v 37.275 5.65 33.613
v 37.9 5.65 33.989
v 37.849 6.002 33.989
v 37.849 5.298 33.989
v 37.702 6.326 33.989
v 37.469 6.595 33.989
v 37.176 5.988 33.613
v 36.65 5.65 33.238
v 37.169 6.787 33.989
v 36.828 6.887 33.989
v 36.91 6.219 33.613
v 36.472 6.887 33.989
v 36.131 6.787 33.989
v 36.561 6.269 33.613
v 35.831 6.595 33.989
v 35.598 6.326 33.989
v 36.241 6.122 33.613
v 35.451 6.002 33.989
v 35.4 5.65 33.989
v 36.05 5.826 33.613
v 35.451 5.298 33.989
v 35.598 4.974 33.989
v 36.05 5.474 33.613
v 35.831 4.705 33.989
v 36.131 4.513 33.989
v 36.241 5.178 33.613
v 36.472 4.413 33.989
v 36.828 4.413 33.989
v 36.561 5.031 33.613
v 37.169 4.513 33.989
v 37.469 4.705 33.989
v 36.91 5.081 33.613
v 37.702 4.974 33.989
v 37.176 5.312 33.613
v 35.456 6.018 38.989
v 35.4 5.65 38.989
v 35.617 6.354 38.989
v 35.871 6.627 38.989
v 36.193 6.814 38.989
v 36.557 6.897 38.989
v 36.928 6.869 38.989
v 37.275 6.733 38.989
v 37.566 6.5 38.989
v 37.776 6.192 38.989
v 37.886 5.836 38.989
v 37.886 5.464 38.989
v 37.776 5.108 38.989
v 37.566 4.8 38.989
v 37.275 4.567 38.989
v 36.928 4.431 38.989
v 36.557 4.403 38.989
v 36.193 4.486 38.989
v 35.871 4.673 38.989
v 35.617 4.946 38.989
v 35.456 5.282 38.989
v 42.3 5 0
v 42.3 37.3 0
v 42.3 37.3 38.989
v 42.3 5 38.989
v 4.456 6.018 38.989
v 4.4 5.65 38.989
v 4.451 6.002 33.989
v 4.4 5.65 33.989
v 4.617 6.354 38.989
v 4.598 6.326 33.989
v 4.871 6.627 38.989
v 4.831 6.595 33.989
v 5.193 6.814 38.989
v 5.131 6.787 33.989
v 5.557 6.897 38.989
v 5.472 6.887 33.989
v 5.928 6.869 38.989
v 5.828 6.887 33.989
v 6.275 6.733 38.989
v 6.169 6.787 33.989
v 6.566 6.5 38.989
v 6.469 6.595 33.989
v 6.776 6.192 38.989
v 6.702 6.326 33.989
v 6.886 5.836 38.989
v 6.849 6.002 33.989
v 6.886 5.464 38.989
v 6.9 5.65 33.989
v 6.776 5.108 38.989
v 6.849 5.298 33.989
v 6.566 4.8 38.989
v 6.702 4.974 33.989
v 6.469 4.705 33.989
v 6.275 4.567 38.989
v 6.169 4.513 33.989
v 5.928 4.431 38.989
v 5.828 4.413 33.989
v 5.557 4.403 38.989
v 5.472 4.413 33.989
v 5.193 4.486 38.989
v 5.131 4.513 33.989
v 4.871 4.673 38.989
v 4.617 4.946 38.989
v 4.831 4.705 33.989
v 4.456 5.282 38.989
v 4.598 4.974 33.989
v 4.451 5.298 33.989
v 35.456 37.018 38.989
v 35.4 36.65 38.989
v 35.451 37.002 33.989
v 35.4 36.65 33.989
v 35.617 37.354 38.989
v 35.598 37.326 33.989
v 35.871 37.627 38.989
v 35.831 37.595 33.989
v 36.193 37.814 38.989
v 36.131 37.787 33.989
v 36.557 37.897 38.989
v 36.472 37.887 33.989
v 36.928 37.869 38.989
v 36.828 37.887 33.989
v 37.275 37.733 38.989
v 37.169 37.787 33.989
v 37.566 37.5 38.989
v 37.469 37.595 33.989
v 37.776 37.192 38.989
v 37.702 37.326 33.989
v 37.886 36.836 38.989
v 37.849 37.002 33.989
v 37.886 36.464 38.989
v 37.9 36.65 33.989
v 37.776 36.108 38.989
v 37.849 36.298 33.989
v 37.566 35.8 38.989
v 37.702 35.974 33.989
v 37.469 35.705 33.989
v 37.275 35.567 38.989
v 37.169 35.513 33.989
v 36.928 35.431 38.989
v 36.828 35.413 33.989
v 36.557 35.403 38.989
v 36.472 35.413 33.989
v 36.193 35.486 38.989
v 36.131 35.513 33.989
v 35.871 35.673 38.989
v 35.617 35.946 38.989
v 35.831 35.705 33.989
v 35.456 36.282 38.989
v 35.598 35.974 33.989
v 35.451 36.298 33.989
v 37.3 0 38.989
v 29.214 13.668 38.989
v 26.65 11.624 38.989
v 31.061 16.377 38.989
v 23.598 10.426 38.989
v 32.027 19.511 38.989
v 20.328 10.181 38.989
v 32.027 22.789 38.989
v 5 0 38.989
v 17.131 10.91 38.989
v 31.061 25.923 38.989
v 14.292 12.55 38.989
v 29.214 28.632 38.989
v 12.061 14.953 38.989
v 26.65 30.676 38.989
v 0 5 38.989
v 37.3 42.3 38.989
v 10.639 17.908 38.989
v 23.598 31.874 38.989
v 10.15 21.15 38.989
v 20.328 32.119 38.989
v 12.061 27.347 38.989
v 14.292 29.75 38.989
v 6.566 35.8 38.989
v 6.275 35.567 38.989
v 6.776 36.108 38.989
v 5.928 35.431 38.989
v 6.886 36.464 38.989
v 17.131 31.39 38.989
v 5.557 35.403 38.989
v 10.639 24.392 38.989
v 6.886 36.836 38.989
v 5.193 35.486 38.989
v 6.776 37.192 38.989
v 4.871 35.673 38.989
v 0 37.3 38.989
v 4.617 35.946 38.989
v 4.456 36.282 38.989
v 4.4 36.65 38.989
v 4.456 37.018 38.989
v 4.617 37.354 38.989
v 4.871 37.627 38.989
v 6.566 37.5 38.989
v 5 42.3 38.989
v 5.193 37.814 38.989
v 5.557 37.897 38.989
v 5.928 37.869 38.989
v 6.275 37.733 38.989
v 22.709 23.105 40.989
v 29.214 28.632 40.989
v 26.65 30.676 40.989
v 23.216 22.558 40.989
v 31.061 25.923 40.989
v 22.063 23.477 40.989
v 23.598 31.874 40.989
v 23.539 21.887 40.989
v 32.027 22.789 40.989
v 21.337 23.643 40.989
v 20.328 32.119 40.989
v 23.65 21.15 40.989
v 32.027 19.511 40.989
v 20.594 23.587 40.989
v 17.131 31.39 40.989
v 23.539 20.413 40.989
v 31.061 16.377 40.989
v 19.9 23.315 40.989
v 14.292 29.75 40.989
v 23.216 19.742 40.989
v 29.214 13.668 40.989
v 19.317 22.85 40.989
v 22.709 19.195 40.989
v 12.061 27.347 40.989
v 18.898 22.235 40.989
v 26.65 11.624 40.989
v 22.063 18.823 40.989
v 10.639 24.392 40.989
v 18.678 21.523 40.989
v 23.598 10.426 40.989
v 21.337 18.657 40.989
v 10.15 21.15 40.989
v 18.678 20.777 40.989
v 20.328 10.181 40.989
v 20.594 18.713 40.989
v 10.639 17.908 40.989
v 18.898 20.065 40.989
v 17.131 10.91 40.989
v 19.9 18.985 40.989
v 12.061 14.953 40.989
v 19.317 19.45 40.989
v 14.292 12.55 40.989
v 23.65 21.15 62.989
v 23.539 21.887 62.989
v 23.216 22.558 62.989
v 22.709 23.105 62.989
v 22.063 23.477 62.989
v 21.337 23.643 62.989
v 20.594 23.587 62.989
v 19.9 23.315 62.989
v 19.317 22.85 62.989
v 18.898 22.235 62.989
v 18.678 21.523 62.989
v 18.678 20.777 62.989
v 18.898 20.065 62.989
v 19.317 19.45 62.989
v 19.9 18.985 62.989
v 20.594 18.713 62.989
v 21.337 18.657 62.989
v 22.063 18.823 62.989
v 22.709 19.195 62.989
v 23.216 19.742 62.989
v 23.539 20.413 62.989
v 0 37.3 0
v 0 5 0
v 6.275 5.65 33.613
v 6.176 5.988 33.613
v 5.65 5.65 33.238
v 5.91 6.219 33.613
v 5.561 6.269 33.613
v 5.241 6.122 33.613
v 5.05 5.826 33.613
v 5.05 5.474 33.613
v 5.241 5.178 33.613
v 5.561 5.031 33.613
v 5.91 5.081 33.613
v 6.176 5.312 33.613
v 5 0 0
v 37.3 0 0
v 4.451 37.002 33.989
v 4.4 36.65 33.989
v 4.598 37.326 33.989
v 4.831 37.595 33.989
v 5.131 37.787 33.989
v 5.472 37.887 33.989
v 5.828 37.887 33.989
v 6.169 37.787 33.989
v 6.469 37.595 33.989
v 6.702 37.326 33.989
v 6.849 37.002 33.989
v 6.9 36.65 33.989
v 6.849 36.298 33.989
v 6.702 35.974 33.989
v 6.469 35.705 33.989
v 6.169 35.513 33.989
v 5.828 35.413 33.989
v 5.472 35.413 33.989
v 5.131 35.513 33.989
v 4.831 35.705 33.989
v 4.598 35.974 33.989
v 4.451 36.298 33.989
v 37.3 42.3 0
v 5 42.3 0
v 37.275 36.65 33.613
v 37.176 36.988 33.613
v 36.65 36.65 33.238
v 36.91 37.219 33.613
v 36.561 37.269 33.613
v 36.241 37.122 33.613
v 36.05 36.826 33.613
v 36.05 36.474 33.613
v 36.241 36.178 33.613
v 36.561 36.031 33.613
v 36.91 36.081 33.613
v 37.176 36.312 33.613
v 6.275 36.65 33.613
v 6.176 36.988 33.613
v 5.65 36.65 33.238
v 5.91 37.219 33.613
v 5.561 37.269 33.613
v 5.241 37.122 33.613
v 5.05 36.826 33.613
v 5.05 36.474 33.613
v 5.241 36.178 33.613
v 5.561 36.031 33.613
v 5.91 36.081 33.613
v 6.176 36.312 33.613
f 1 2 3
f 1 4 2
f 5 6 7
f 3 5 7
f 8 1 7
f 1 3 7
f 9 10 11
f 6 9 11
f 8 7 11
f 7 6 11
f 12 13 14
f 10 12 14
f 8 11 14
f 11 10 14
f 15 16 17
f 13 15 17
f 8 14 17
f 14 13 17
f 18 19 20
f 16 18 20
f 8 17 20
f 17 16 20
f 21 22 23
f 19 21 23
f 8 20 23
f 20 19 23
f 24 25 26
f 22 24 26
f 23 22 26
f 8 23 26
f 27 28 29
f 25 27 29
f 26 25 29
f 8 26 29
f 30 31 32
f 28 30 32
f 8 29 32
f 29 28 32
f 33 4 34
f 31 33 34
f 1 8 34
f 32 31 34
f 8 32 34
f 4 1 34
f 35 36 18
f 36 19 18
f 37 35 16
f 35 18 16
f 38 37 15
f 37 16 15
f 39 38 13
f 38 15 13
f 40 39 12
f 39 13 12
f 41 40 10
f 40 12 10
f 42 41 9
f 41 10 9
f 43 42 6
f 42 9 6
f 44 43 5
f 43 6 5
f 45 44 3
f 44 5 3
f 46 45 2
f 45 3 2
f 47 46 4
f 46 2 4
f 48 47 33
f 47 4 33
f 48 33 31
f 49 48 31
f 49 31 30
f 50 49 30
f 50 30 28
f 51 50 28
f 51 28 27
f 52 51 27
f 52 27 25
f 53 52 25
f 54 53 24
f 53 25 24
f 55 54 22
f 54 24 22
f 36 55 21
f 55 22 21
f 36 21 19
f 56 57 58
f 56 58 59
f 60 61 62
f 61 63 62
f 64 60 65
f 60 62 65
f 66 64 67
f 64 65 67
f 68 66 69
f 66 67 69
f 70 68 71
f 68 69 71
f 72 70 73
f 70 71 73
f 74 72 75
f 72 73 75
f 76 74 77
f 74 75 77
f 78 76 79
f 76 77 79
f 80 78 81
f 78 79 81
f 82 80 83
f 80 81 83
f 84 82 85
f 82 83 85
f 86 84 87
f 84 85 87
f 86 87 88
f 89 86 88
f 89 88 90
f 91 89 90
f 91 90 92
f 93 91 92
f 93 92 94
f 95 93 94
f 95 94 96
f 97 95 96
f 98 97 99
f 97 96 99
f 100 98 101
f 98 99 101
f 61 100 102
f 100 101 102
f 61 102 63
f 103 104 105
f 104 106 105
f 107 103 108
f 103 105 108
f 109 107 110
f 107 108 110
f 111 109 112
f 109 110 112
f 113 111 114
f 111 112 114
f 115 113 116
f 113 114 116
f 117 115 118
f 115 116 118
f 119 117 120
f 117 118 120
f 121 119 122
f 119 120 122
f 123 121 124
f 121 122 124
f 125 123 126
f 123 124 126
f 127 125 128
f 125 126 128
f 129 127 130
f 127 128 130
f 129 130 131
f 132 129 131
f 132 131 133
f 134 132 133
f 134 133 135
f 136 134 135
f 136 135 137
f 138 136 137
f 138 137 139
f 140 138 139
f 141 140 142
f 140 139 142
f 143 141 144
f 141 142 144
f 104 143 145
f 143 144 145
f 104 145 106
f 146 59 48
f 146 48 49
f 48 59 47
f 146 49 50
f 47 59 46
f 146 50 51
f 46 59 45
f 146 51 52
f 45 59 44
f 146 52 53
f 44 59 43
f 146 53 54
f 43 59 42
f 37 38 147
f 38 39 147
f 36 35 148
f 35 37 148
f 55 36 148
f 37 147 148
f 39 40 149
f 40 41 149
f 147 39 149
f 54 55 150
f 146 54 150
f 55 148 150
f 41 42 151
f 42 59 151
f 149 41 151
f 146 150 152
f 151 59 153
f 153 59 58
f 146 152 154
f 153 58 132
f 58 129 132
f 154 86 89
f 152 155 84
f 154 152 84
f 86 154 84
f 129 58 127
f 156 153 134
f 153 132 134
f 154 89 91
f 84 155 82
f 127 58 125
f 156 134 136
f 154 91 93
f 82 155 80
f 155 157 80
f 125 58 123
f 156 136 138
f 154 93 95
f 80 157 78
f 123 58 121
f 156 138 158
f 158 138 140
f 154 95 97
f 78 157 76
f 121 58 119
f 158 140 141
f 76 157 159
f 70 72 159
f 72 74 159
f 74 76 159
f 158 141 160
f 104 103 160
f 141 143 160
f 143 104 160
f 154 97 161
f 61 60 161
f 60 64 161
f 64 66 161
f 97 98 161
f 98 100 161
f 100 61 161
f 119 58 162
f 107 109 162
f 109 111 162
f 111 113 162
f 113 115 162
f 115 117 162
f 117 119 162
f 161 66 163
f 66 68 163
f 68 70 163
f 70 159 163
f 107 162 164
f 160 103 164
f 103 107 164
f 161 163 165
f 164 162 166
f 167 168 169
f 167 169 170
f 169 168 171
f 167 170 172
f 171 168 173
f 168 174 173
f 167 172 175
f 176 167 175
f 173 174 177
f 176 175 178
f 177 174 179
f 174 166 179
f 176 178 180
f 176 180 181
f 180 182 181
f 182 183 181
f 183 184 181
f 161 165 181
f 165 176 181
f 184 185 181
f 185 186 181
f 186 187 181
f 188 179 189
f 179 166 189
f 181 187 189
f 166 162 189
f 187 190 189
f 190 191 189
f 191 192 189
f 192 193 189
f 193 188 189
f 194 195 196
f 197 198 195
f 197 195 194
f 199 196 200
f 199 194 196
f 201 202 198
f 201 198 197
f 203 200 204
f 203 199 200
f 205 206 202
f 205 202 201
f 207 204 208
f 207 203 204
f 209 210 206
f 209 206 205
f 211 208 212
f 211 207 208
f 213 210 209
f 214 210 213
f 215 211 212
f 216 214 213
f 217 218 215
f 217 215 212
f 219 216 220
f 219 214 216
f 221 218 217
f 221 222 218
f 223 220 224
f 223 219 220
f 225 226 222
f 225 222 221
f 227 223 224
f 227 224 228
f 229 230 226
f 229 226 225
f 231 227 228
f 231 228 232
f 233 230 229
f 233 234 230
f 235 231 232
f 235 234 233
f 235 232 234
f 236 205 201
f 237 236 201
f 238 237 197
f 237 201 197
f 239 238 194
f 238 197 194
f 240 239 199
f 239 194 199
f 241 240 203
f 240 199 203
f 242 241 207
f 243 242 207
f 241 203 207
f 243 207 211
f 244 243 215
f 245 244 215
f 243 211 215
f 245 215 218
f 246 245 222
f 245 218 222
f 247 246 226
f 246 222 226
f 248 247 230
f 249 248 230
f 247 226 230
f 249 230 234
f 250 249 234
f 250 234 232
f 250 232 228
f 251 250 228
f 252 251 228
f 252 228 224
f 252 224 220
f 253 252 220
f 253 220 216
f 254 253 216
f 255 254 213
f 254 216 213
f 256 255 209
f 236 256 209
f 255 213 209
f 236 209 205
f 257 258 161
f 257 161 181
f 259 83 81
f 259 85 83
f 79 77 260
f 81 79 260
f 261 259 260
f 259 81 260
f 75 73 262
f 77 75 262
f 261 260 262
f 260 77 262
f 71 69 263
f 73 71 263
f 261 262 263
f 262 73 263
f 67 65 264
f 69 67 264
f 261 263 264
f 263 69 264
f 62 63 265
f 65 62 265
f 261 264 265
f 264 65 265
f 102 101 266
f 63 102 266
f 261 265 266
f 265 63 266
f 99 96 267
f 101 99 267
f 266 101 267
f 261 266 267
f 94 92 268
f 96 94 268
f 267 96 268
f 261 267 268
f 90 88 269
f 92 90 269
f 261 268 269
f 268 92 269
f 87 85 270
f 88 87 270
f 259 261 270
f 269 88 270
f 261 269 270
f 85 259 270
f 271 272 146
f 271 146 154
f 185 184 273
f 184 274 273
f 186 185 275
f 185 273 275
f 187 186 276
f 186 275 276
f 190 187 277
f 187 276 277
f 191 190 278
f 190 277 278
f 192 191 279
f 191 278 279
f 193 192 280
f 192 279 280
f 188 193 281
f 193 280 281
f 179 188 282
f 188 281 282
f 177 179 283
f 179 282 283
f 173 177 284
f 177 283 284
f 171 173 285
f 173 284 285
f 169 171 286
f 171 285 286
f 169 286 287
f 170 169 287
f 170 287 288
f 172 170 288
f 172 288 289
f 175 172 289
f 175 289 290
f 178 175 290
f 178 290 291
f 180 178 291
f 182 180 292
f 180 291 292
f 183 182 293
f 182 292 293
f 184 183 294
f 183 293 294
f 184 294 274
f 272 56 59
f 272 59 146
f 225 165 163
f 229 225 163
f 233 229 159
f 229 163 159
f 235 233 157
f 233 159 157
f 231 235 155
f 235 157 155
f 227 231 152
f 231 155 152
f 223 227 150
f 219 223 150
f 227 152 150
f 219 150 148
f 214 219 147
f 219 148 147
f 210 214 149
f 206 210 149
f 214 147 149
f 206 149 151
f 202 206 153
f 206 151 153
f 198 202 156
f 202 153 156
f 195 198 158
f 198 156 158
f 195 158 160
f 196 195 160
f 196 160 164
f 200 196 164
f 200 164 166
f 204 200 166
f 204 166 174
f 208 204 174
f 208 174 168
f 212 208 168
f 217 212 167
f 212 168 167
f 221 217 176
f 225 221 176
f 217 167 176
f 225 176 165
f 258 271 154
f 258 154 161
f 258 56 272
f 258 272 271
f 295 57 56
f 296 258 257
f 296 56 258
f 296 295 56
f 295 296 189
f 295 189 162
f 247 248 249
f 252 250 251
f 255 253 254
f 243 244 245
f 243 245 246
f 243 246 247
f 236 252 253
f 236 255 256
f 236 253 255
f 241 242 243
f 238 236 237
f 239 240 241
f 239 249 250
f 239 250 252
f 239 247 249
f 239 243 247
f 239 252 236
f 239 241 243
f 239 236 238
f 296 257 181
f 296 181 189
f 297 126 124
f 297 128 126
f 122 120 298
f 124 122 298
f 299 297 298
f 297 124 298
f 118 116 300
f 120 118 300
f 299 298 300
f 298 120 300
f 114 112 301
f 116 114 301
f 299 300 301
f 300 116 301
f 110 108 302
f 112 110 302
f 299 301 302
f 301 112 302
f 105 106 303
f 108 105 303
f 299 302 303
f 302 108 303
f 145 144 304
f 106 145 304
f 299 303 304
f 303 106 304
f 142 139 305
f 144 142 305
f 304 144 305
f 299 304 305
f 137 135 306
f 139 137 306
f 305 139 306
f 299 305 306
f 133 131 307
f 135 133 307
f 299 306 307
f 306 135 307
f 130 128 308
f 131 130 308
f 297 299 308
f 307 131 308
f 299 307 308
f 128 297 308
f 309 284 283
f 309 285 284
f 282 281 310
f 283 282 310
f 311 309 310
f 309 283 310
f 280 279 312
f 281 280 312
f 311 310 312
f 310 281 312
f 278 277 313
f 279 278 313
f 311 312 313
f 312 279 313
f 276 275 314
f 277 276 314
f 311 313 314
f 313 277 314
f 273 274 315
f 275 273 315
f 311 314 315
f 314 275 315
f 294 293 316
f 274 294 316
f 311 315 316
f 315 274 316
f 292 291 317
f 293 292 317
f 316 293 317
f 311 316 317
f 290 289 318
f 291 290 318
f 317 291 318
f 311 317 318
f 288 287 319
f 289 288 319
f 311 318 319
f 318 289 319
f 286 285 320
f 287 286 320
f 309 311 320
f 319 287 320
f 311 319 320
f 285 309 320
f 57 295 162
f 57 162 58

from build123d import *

# Parameters (mm, degrees)
BOSS_EXTRUDE1_DEPTH       = 38.989
M3X0_5_TAPPED_HOLE1_D     = 2.5
M3X0_5_TAPPED_HOLE1_DEPTH = 5
M3X0_5_TAPPED_HOLE1_TIP   = 0.751075774
SKETCH4_R                 = 11
BOSS_EXTRUDE2_DEPTH       = 2
SKETCH5_R                 = 2.5
BOSS_EXTRUDE3_DEPTH       = 22


with BuildPart() as part:
    # Sketch1 → Boss-Extrude1 (new body)
    with BuildSketch(Plane.XY):
        Polygon((0, 37.3), (5, 42.3), (37.3, 42.3), (42.3, 37.3), (42.3, 5), (37.3, 0), (5, 0), (0, 5), align=None)
    extrude(amount=BOSS_EXTRUDE1_DEPTH)

    # M3x0.5 Tapped Hole1
    with Locations(Plane.XY.offset(38.989)):
        with Locations((5.65, 36.65), (36.65, 36.65), (36.65, 5.65), (5.65, 5.65)):
            Hole(M3X0_5_TAPPED_HOLE1_D / 2, depth=M3X0_5_TAPPED_HOLE1_DEPTH)
            with Locations((0, 0, -(M3X0_5_TAPPED_HOLE1_DEPTH + M3X0_5_TAPPED_HOLE1_TIP / 2))):  # 118° drill point
                Cone(0, M3X0_5_TAPPED_HOLE1_D / 2, M3X0_5_TAPPED_HOLE1_TIP, mode=Mode.SUBTRACT)

    # Sketch4 → Boss-Extrude2 (add)
    with BuildSketch(Plane.XY.offset(38.989)):
        with Locations(Location((21.15, 21.15, 0), (0, 0, 180))):
            Circle(SKETCH4_R)
    extrude(amount=BOSS_EXTRUDE2_DEPTH)

    # Sketch5 → Boss-Extrude3 (add)
    with BuildSketch(Plane.XY.offset(40.989)):
        with Locations((21.15, 21.15)):
            Circle(SKETCH5_R)
    extrude(amount=BOSS_EXTRUDE3_DEPTH)


solid = part.part
